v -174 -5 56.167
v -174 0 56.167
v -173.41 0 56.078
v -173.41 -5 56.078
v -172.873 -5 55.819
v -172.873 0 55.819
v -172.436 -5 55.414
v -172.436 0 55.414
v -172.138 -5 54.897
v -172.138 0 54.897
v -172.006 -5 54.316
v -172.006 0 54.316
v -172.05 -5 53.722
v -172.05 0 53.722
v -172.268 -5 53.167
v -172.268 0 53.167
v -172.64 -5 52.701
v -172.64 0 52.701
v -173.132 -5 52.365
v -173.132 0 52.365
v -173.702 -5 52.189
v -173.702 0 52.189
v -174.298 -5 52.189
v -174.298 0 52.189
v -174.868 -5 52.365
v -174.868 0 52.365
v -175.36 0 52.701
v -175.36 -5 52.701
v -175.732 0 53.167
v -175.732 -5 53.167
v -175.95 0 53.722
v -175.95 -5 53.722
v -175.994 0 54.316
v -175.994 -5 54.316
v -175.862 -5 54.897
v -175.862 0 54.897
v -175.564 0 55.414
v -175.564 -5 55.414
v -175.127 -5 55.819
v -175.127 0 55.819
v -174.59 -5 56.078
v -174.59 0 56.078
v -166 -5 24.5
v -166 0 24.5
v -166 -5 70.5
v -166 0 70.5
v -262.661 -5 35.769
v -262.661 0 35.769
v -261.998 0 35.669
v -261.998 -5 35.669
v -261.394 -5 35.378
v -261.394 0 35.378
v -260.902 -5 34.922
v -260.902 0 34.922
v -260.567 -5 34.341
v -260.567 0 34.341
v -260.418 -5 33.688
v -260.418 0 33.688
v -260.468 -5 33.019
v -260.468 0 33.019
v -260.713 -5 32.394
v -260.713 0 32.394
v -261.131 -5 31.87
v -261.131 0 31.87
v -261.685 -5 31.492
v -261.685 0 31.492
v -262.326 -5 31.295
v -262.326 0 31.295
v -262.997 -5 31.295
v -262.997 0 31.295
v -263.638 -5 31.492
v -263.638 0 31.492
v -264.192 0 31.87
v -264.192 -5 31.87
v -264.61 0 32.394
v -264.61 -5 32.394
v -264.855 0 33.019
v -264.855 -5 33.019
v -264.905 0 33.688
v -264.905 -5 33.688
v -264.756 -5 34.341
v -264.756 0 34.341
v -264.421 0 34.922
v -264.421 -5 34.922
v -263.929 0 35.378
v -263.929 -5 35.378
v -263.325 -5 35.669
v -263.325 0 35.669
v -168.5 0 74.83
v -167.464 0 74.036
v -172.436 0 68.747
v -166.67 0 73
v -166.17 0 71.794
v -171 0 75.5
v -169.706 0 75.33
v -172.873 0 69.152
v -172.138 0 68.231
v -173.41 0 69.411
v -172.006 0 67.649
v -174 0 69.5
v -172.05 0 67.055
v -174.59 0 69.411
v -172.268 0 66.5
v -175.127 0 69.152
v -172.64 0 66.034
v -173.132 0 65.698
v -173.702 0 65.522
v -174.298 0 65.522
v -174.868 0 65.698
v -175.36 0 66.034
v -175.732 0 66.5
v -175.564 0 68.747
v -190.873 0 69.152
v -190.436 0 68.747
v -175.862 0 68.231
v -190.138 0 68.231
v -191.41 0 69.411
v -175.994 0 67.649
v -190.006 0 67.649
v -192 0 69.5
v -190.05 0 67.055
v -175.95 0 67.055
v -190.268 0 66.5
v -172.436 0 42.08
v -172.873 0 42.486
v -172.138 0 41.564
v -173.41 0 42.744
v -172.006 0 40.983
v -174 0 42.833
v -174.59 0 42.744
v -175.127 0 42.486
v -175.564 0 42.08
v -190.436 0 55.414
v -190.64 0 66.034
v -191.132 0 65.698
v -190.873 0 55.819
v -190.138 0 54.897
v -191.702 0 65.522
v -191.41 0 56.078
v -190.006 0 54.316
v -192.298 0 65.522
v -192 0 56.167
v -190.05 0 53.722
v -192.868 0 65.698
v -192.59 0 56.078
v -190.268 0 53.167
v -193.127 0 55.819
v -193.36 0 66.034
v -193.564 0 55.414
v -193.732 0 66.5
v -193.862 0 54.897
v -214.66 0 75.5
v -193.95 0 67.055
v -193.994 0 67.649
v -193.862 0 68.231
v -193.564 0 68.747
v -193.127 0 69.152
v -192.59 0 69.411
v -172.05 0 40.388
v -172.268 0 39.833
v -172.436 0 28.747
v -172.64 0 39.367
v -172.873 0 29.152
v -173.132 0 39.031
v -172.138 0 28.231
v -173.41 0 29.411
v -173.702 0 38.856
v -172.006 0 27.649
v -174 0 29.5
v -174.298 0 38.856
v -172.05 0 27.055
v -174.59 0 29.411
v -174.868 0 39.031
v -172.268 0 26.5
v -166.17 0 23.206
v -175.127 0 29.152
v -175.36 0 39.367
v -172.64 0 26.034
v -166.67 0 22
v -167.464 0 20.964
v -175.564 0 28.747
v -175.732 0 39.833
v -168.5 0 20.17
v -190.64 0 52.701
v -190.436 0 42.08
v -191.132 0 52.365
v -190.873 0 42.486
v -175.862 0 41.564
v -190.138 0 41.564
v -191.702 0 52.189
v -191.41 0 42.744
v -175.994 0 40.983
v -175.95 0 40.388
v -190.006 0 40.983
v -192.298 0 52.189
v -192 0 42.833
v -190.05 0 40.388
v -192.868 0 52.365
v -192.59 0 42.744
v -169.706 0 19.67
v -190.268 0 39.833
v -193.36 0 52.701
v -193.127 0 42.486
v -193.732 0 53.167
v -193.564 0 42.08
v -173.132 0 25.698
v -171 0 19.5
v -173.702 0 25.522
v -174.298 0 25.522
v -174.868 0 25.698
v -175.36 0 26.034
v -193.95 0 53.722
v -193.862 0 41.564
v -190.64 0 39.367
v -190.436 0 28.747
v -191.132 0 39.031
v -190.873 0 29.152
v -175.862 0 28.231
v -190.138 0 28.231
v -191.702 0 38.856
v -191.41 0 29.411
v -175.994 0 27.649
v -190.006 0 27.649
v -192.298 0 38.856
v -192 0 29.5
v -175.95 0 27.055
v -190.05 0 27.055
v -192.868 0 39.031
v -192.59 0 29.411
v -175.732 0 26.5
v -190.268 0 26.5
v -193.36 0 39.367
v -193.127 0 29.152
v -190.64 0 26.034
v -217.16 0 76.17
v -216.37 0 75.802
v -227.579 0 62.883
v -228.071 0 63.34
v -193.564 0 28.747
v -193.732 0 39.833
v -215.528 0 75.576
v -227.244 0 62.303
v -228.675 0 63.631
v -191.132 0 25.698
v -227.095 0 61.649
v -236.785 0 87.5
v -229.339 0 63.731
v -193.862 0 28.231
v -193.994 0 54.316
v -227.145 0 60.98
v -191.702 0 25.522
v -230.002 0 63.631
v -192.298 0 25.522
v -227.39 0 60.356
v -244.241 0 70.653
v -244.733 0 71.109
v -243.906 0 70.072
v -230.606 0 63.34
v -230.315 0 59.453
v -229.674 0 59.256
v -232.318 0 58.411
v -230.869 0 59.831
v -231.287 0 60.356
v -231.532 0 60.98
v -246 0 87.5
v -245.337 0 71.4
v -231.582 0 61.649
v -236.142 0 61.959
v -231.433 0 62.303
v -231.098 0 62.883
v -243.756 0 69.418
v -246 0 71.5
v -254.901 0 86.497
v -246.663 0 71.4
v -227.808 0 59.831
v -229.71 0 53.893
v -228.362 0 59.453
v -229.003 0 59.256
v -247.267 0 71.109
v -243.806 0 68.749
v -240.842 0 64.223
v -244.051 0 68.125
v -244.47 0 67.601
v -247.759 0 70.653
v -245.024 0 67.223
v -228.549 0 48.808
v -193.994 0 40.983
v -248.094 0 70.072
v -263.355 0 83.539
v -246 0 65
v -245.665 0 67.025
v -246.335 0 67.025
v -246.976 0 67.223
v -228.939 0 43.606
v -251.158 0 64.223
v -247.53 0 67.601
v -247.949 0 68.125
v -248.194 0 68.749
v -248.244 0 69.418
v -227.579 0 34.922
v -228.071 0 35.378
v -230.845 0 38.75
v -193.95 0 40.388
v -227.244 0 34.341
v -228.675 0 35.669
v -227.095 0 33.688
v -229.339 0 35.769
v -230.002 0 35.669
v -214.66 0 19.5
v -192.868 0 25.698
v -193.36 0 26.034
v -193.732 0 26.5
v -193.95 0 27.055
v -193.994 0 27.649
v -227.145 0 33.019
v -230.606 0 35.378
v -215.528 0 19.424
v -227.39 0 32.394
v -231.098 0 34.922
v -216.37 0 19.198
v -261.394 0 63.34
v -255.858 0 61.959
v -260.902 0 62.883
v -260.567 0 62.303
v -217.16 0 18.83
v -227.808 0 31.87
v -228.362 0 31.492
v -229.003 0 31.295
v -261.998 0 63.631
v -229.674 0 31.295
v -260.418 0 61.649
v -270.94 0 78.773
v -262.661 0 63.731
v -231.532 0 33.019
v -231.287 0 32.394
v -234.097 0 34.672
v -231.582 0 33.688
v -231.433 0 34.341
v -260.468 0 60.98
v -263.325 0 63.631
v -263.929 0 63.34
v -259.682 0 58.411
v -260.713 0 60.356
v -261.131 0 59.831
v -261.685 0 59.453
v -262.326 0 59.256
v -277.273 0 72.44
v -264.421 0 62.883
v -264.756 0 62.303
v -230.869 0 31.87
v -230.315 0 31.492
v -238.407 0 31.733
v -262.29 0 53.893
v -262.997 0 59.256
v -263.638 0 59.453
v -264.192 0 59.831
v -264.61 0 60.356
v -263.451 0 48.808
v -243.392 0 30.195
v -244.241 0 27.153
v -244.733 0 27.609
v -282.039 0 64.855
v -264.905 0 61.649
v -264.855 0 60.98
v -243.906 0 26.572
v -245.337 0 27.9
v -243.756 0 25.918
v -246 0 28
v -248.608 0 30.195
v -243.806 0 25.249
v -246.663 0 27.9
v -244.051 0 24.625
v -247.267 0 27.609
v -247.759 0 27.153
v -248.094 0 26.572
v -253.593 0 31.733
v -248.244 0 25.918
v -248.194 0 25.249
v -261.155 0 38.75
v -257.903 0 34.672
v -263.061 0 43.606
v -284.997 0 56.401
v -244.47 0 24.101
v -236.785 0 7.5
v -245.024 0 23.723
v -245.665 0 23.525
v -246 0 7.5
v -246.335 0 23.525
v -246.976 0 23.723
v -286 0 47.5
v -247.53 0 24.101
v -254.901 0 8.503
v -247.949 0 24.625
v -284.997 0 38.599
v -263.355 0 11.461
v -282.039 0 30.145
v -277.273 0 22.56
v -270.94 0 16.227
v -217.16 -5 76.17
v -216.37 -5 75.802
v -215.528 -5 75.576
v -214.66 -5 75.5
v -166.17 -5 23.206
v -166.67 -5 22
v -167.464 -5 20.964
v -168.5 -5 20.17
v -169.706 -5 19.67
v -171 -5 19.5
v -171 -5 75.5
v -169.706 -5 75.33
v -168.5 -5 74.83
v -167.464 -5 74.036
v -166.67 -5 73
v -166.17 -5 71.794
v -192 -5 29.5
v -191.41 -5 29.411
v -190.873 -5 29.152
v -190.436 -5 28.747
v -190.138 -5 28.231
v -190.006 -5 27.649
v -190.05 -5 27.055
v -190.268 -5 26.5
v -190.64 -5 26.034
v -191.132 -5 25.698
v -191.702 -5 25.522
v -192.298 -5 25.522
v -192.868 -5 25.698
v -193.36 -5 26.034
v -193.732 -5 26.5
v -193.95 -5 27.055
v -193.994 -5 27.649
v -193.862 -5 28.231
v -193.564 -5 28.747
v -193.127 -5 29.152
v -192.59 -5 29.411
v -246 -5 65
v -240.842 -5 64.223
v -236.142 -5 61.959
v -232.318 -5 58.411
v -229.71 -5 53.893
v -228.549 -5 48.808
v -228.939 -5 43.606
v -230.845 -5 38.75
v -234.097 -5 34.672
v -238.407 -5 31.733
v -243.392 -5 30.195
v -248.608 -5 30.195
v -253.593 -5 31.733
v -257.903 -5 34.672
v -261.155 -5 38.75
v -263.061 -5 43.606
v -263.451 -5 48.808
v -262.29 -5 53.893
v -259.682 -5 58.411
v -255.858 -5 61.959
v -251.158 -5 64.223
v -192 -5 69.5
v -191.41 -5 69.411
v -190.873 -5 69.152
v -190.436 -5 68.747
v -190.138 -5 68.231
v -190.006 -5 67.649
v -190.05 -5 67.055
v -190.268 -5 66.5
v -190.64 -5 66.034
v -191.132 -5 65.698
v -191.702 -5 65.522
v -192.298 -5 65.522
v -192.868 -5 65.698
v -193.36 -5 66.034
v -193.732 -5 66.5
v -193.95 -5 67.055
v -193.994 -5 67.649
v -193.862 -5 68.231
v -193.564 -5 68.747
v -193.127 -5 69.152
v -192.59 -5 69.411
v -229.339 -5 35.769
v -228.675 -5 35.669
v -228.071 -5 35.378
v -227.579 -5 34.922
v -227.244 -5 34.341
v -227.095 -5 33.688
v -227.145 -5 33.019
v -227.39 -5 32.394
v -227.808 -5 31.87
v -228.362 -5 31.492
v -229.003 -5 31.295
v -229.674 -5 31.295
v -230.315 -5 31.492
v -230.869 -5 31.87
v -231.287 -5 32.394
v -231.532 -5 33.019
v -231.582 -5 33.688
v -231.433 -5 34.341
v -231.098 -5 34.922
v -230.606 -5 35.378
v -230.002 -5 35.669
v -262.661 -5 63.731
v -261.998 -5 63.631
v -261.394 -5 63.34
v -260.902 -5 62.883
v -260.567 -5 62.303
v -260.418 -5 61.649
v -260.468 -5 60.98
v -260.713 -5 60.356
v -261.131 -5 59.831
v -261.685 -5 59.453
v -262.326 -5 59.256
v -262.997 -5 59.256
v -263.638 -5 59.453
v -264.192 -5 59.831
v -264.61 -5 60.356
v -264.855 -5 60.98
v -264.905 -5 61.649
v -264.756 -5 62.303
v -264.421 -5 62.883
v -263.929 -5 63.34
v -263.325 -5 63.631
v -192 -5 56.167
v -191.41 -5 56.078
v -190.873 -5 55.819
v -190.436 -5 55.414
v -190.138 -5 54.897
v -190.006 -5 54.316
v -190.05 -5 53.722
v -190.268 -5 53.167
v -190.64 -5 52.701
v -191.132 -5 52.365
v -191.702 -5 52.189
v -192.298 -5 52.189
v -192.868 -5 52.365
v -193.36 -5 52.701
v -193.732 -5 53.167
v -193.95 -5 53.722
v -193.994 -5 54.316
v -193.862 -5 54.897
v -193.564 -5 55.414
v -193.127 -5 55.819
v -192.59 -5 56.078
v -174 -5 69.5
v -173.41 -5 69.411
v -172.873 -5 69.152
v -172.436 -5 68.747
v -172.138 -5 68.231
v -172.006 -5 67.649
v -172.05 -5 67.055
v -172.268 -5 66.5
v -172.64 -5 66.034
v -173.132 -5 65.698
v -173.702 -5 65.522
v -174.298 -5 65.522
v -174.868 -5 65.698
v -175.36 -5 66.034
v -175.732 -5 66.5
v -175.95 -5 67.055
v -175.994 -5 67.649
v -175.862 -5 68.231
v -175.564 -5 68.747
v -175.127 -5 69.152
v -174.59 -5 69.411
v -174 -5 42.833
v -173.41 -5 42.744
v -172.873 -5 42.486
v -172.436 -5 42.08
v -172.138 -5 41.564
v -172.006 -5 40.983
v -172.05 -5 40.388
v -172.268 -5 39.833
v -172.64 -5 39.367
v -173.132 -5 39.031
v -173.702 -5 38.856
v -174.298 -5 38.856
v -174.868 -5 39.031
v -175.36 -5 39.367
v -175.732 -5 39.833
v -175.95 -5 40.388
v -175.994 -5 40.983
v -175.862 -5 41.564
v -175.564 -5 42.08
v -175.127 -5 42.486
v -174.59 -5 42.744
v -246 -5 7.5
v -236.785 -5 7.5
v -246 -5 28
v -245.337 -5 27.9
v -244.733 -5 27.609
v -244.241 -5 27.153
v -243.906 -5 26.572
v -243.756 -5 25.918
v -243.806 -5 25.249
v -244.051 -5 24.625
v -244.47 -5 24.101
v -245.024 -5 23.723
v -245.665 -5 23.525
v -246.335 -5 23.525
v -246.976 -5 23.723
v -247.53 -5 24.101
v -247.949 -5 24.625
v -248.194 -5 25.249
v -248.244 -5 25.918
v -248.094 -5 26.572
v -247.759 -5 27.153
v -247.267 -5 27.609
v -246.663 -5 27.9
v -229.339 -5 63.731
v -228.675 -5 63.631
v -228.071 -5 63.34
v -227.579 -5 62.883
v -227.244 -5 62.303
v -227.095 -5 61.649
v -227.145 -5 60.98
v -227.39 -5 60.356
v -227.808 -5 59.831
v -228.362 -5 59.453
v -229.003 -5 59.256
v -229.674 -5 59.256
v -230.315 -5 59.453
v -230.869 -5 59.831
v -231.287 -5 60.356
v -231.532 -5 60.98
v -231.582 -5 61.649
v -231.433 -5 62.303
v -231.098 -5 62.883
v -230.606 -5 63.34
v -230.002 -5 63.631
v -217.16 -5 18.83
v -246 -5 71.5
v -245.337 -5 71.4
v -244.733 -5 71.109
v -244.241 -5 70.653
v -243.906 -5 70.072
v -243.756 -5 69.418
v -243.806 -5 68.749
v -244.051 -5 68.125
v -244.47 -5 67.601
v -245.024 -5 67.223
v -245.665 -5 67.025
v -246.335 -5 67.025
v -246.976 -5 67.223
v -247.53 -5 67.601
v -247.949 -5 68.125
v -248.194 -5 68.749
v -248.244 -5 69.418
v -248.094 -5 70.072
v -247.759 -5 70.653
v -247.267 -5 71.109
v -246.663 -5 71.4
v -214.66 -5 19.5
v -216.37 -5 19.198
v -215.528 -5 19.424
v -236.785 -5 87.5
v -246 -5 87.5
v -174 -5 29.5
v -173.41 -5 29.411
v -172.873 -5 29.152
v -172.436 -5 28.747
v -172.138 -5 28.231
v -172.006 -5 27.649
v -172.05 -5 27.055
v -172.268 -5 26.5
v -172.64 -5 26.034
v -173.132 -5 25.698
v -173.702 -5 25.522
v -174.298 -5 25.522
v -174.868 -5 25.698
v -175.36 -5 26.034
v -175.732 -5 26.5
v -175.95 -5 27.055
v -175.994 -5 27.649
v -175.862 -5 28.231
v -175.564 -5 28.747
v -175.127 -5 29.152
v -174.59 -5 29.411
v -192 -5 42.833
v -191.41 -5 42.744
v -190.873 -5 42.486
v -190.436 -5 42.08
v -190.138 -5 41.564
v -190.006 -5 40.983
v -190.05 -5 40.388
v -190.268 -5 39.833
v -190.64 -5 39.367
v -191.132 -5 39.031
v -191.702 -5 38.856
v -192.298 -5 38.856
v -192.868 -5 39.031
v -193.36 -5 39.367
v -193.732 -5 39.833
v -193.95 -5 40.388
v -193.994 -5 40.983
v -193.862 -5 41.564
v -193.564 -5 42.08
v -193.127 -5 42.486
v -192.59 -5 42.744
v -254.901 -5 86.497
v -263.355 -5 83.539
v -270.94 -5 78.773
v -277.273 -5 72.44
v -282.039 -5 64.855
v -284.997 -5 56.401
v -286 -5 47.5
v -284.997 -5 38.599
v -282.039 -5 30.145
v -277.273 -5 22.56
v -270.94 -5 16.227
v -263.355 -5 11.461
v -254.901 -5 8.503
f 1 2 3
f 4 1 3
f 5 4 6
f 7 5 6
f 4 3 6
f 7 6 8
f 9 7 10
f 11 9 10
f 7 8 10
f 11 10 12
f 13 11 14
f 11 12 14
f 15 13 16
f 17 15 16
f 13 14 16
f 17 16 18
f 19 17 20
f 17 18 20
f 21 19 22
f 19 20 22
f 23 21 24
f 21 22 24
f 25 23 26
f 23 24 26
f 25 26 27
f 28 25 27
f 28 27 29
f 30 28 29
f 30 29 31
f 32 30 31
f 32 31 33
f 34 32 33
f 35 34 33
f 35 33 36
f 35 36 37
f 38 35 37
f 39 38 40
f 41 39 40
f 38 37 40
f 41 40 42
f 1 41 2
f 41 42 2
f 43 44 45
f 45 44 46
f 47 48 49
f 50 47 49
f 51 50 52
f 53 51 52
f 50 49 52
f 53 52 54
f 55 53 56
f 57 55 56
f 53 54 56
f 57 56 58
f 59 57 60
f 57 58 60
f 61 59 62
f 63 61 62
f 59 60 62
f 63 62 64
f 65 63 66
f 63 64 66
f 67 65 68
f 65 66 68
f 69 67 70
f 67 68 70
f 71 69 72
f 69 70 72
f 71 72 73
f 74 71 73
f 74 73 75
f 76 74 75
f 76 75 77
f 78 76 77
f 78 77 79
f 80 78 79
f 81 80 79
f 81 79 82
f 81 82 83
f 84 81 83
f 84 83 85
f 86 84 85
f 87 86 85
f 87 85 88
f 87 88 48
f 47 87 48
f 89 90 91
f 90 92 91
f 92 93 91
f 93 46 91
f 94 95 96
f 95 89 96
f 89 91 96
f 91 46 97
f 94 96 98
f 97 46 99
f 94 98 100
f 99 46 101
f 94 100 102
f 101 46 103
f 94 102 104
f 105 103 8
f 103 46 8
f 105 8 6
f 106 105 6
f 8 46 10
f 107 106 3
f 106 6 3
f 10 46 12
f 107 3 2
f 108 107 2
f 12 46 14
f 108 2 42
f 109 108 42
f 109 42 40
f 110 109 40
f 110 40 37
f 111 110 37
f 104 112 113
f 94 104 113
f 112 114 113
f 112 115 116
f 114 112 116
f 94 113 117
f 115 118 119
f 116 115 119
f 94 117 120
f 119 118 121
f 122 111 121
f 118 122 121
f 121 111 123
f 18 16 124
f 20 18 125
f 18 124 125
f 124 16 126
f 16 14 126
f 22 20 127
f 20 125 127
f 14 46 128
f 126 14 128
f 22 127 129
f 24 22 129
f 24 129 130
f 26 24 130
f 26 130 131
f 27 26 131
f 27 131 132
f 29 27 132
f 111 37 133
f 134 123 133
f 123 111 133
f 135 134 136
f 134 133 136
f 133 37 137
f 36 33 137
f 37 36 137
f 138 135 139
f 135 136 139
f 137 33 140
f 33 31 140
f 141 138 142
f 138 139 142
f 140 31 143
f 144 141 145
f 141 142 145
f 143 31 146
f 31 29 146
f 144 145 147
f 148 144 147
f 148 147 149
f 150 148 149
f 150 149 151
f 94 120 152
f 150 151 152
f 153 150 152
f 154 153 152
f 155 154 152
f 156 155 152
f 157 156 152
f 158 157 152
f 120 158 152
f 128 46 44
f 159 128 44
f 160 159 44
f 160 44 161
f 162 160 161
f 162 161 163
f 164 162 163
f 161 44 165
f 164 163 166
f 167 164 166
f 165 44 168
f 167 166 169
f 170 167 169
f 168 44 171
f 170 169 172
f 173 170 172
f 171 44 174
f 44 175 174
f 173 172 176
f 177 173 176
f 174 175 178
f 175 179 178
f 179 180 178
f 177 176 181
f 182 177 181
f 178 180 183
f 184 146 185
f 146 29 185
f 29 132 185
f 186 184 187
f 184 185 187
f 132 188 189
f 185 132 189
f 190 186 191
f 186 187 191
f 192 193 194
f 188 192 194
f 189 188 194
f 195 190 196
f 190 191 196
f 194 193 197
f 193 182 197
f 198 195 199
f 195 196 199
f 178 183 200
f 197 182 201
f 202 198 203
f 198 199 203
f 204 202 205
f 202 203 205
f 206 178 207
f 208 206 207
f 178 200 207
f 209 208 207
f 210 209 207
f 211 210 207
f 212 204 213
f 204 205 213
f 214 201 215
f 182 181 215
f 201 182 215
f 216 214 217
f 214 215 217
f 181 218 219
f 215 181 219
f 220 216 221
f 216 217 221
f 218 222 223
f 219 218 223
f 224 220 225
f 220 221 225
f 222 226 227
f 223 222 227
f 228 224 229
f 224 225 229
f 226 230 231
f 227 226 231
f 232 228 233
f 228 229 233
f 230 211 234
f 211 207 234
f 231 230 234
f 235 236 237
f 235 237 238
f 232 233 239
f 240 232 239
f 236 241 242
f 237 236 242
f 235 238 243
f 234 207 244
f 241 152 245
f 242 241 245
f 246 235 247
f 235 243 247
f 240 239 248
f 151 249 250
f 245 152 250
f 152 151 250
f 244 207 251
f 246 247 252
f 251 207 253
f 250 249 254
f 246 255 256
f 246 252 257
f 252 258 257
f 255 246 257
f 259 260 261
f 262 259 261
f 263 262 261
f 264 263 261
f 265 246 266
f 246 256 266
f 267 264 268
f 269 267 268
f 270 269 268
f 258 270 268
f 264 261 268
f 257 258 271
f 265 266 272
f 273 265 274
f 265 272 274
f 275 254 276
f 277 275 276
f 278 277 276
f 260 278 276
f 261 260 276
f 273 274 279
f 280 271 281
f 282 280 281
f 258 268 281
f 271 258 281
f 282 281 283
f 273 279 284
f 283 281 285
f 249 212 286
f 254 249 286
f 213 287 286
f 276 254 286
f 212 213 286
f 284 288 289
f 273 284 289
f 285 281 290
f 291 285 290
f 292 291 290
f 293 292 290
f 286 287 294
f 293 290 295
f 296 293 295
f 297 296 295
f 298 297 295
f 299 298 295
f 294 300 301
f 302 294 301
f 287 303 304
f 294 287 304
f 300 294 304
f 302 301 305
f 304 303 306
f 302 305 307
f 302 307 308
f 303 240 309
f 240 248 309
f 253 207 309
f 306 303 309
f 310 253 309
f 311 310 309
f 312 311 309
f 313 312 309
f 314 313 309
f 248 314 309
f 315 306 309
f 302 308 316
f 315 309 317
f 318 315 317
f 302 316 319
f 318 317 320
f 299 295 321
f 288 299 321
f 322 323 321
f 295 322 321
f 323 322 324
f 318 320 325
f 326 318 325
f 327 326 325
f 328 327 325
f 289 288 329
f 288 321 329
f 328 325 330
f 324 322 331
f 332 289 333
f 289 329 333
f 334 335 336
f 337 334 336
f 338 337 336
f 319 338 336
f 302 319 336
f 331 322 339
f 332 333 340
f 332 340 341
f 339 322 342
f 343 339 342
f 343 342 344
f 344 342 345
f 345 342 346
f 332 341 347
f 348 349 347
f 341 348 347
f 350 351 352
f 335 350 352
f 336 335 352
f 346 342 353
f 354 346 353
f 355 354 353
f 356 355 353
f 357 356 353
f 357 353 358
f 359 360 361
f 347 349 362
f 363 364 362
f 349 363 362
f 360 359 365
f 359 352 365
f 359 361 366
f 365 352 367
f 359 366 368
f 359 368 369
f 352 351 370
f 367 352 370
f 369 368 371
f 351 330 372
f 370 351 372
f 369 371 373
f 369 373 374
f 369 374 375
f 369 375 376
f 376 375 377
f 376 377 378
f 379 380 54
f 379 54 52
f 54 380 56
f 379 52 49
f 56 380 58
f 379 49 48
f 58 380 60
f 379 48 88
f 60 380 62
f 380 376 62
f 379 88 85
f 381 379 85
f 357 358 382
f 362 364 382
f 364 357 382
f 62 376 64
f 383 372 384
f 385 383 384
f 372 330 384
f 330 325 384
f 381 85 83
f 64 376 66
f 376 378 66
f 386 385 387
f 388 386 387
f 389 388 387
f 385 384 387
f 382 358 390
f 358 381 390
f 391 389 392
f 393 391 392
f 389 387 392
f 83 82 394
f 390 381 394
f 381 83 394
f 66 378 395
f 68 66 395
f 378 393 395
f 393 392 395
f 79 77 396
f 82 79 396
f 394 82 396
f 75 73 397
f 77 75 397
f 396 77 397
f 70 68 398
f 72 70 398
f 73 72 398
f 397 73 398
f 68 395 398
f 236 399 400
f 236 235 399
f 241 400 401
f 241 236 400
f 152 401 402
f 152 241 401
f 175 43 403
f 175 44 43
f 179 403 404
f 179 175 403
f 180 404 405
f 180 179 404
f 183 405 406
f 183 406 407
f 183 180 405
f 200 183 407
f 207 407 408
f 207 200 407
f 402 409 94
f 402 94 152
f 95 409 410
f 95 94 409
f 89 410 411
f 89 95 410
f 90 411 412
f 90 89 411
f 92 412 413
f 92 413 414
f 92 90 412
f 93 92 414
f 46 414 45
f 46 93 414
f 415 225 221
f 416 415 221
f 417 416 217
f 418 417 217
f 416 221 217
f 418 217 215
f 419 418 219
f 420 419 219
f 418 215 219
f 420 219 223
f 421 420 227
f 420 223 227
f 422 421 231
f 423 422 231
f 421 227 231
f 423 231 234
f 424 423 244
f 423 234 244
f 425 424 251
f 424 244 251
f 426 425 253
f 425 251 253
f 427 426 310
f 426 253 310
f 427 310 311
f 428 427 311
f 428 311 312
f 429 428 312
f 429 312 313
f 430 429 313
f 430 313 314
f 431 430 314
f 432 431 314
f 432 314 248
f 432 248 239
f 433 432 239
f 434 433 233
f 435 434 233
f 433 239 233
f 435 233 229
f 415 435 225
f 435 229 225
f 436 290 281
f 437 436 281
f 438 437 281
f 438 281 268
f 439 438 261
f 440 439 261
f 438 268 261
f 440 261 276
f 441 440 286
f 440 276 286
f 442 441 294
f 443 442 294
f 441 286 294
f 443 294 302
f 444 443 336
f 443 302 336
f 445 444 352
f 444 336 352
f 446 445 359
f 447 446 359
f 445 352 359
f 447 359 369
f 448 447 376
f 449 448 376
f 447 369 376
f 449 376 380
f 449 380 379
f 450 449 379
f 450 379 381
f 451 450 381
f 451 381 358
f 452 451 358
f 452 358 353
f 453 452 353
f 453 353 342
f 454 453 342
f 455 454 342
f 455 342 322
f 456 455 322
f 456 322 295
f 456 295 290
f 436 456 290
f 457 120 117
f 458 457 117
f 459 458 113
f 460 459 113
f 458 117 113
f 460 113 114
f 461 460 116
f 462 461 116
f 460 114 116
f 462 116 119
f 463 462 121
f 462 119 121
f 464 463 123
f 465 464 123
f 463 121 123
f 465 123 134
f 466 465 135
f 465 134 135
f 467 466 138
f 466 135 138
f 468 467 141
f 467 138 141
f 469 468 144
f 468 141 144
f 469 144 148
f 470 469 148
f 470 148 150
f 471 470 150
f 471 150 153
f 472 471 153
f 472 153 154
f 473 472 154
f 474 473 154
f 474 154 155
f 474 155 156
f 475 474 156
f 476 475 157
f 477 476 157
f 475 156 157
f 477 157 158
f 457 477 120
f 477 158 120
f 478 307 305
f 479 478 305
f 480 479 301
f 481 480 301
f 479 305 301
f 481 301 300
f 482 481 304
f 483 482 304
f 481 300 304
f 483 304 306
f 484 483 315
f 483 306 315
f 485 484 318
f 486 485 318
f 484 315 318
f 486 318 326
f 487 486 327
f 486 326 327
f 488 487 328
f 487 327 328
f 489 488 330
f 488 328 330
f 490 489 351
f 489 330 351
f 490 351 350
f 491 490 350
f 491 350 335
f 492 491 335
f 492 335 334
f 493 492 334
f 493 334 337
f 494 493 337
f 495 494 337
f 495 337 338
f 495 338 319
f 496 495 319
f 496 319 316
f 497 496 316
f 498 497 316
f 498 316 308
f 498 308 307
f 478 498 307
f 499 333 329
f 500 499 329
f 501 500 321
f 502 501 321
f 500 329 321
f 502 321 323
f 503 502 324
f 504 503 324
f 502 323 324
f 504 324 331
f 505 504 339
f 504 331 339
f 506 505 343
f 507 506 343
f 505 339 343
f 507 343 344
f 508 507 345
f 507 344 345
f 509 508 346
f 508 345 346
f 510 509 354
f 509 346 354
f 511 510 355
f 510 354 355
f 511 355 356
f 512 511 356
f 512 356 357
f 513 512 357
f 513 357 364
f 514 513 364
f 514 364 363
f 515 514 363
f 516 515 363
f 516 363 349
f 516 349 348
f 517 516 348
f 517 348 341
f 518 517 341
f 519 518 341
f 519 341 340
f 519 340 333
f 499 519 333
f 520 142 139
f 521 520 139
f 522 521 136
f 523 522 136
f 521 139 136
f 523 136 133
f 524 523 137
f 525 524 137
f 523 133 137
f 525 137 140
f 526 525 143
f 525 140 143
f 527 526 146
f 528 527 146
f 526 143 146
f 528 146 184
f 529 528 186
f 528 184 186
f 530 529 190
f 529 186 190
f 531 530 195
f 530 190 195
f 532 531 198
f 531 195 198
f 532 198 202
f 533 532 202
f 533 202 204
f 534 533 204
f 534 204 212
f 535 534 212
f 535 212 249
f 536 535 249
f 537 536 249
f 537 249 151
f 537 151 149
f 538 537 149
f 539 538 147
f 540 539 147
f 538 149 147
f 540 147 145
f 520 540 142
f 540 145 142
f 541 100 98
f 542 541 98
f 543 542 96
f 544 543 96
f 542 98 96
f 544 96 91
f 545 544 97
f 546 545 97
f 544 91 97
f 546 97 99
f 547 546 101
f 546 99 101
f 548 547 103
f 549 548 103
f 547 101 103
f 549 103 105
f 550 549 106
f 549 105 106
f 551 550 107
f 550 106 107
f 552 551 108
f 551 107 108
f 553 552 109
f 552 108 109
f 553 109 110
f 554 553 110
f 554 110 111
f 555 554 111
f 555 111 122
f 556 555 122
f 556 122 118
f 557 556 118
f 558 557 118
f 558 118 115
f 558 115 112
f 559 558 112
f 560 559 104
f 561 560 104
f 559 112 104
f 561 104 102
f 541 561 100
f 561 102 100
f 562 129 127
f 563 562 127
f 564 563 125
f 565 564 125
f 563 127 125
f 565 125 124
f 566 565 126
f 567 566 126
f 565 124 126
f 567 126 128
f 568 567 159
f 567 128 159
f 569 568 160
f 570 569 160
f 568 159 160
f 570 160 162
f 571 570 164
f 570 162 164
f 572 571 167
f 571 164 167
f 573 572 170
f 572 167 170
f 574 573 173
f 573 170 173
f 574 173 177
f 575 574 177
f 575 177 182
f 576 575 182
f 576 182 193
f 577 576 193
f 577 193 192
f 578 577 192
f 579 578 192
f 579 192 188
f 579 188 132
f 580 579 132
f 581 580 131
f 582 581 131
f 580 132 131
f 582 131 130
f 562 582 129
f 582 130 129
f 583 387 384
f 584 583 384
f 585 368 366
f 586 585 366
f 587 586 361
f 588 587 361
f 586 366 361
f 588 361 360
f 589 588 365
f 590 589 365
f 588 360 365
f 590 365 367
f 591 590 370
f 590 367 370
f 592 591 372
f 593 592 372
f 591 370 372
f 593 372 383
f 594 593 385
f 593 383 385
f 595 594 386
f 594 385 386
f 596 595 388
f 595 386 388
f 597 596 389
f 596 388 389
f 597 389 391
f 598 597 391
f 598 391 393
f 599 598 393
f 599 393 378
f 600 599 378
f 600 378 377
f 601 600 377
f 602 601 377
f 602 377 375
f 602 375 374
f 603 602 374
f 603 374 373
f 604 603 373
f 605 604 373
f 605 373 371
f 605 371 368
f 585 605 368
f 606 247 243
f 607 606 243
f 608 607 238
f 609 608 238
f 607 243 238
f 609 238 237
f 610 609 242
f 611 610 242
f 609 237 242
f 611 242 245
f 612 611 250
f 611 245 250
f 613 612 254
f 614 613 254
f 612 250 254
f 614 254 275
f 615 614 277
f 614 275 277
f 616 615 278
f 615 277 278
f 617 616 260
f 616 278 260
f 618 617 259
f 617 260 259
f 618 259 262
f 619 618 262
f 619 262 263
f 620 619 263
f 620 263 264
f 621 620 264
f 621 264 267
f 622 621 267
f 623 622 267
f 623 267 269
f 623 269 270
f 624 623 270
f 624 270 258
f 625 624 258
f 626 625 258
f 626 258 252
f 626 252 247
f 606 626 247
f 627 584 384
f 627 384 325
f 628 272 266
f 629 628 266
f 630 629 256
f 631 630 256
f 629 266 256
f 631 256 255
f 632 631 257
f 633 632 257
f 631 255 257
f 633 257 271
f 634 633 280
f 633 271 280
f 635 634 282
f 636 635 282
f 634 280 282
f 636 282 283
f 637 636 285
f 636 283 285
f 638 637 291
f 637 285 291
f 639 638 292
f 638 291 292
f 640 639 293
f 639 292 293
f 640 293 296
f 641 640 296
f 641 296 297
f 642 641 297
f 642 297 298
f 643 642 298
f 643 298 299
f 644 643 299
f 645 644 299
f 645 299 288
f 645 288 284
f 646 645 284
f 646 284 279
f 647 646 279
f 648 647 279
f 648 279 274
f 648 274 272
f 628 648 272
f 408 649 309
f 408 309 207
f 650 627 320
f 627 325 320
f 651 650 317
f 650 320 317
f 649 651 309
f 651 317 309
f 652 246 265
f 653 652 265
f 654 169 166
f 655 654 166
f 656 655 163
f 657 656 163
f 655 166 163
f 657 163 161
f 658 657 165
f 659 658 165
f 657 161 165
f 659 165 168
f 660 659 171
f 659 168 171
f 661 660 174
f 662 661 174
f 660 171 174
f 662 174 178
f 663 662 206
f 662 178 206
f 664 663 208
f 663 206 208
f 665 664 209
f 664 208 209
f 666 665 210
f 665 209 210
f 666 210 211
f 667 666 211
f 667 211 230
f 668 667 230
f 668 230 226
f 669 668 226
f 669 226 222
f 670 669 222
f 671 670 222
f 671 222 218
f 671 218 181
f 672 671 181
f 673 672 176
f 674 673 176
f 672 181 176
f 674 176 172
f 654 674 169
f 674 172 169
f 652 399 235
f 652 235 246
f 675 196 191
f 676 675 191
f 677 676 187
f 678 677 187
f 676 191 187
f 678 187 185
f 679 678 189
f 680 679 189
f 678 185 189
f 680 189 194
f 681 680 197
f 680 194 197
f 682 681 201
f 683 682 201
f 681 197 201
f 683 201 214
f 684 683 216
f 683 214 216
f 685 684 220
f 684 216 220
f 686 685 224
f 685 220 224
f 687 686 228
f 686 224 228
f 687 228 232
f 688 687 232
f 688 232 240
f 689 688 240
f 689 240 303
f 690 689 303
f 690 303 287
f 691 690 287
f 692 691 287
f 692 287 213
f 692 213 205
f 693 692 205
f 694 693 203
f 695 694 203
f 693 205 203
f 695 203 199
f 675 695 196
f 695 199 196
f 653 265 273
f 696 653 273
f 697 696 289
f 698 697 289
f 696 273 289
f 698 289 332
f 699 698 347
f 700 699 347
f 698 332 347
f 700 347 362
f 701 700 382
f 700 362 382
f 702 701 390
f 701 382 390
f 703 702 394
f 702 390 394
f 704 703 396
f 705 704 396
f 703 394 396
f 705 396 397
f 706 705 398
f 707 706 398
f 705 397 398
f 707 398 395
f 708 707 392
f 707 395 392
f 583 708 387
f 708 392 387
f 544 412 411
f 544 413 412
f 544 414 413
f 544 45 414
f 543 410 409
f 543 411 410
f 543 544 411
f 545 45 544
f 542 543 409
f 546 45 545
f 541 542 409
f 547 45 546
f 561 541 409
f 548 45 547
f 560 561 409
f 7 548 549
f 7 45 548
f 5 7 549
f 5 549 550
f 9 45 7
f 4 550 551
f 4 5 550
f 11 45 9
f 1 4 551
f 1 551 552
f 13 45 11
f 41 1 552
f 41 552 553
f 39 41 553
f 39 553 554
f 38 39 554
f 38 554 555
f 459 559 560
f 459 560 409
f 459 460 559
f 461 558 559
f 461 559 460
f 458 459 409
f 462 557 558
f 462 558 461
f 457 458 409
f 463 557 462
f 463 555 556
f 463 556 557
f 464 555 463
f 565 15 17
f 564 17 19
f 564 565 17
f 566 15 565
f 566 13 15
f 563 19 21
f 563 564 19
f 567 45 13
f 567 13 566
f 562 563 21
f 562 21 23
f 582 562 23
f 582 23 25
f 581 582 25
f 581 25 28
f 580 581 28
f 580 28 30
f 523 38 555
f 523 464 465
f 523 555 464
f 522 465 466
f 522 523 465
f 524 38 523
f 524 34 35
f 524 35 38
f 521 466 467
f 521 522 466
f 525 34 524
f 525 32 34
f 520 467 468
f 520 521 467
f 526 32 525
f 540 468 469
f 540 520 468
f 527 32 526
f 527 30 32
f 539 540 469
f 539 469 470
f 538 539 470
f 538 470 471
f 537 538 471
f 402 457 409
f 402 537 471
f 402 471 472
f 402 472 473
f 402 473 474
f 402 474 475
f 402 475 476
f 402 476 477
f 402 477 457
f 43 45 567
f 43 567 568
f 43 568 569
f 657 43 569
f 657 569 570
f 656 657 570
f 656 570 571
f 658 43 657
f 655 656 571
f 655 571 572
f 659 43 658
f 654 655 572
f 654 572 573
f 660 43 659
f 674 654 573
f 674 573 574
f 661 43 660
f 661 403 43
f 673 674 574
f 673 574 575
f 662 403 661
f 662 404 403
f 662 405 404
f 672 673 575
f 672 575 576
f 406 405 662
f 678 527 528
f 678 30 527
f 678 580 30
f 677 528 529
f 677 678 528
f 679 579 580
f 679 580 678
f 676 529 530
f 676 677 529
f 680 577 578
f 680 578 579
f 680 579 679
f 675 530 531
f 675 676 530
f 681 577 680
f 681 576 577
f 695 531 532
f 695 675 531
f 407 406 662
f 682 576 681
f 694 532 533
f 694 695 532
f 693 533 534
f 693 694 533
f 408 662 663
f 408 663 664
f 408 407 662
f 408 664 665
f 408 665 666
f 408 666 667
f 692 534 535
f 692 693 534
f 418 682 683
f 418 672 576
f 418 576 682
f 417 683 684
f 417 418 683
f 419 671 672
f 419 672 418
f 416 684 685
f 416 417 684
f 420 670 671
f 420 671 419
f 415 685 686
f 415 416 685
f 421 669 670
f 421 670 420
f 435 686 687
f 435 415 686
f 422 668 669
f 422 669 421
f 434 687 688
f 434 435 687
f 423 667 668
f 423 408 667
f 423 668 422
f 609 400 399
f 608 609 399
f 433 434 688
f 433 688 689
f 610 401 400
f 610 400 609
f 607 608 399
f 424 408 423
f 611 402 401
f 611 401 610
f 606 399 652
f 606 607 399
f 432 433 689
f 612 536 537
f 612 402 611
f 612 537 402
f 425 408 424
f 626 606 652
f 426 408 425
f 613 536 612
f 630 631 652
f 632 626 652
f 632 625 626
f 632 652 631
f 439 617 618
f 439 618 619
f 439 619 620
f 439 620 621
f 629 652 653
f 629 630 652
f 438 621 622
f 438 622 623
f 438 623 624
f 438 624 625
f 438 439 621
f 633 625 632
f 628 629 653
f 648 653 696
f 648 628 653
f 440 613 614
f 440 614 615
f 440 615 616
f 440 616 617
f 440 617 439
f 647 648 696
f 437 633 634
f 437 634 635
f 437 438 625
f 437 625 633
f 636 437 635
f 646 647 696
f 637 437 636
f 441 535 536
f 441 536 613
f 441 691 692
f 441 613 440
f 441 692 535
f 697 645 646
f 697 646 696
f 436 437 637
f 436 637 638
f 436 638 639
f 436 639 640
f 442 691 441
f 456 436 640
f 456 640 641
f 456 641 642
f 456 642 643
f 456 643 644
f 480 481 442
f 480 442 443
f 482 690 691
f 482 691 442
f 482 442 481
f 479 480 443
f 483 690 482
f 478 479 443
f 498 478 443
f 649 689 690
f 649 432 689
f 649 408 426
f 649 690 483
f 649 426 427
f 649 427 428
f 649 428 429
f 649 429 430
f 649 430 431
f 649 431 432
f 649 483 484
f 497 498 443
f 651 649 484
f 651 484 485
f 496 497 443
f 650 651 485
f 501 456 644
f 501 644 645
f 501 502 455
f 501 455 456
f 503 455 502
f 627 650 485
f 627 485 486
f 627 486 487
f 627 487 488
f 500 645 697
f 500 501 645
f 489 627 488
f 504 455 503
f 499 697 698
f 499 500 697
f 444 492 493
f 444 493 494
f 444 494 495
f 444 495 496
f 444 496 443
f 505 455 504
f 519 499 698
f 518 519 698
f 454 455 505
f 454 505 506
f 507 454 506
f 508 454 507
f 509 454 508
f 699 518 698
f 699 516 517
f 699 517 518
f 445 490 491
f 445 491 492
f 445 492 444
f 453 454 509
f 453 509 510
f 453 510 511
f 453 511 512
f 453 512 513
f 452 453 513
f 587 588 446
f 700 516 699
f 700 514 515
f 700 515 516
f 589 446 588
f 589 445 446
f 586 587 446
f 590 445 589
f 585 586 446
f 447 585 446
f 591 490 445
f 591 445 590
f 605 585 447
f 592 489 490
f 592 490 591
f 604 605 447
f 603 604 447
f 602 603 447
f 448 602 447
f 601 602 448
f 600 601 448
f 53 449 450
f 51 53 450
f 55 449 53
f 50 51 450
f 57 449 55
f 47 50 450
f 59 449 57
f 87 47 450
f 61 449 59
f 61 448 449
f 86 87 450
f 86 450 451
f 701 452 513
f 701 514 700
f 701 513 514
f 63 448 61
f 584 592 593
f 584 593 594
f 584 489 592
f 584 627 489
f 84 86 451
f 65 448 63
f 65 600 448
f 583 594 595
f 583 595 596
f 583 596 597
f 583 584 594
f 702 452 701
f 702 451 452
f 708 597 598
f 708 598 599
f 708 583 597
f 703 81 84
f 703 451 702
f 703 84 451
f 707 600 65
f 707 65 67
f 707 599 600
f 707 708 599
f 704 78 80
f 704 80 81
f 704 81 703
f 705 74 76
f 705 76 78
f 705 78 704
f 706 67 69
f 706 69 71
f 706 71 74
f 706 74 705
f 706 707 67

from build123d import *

# Parameters (mm, degrees)
SKETCH_1_W          = 270
SKETCH_1_H          = 5
EXTRUDE_1_DEPTH     = 95
SKETCH_2_R          = 2.25
SKETCH_2_R_2        = 17.5
CUT_EXTRUDE_1_DEPTH = 10
SKETCH_3_W          = 70
SKETCH_3_H          = 20
CUT_EXTRUDE_2_DEPTH = 10
SKETCH_6_W          = 219.864116777
SKETCH_6_H          = 129.686347052
CUT_EXTRUDE_5_DEPTH = 10
SKETCH_7_W          = 55.982845341
SKETCH_7_H          = 55
EXTRUDE_1_2_DEPTH   = 5
SKETCH_9_R          = 2
CUT_EXTRUDE_6_DEPTH = 5
FILLET_1_R          = 5
CUT_EXTRUDE_START   = -5
CUT_EXTRUDE_7_DEPTH = 5
FILLET_2_R          = 5


with BuildPart() as part:
    # 草图1 → Extrude 1 (new body)
    with BuildSketch(Plane.XY):
        with Locations((-135, -2.5)):
            Rectangle(SKETCH_1_W, SKETCH_1_H)
    extrude(amount=EXTRUDE_1_DEPTH)

    # 草图2 → 切除-拉伸1 (cut)
    with BuildSketch(Plane(origin=(0, 0, 0), x_dir=(1, 0, 0), z_dir=(0, 1, 0))):
        with Locations(Location((-246, -25.75, 0), (0, 0, 270))):
            Circle(SKETCH_2_R)
        with Locations(Location((-229.338533362, -33.519369489, 0), (0, 0, 270))):
            Circle(SKETCH_2_R)
        with Locations(Location((-262.661466638, -33.519369489, 0), (0, 0, 270))):
            Circle(SKETCH_2_R)
        with Locations(Location((-262.661466638, -61.480630511, 0), (0, 0, 270))):
            Circle(SKETCH_2_R)
        with Locations(Location((-246, -69.25, 0), (0, 0, 270))):
            Circle(SKETCH_2_R)
        with Locations(Location((-229.338533362, -61.480630511, 0), (0, 0, 270))):
            Circle(SKETCH_2_R)
        with Locations(Location((-246, -47.5, 0), (0, 0, 270))):
            Circle(SKETCH_2_R_2)
    extrude(amount=-CUT_EXTRUDE_1_DEPTH, mode=Mode.SUBTRACT)

    # 草图3 → 切除-拉伸2 (cut)
    with BuildSketch(Plane(origin=(0, 0, 0), x_dir=(1, 0, 0), z_dir=(0, 1, 0))):
        with Locations((-235, -85)):
            Rectangle(SKETCH_3_W, SKETCH_3_H)
        with Locations((-235, -10)):
            Rectangle(SKETCH_3_W, SKETCH_3_H)
        with BuildLine():
            Line((-190, -10), (-190, -34.757359313))
            ThreePointArc((-190, -34.757359313), (-188.148050297, -37.52899791), (-184.878679656, -36.878679656))
            Line((-184.878679656, -36.878679656), (-160.121320344, -12.121320344))
            ThreePointArc((-160.121320344, -12.121320344), (-159.47100209, -8.851949703), (-162.242640687, -7))
            Line((-162.242640687, -7), (-187, -7))
            ThreePointArc((-187, -7), (-189.121320344, -7.878679656), (-190, -10))
        make_face()
        with BuildLine():
            Line((-154.121320344, -12.121320344), (-178.878679656, -36.878679656))
            ThreePointArc((-178.878679656, -36.878679656), (-179.52899791, -40.148050297), (-176.757359313, -42))
            Line((-176.757359313, -42), (-152, -42))
            ThreePointArc((-152, -42), (-149.878679656, -41.121320344), (-149, -39))
            Line((-149, -39), (-149, -14.242640687))
            ThreePointArc((-149, -14.242640687), (-150.851949703, -11.47100209), (-154.121320344, -12.121320344))
        make_face()
        with BuildLine():
            Line((-112.242640687, -7), (-137, -7))
            ThreePointArc((-137, -7), (-139.121320344, -7.878679656), (-140, -10))
            Line((-140, -10), (-140, -34.757359313))
            ThreePointArc((-140, -34.757359313), (-138.148050297, -37.52899791), (-134.878679656, -36.878679656))
            Line((-134.878679656, -36.878679656), (-110.121320344, -12.121320344))
            ThreePointArc((-110.121320344, -12.121320344), (-109.47100209, -8.851949703), (-112.242640687, -7))
        make_face()
        with BuildLine():
            Line((-99, -39), (-99, -14.242640687))
            ThreePointArc((-99, -14.242640687), (-100.851949703, -11.47100209), (-104.121320344, -12.121320344))
            Line((-104.121320344, -12.121320344), (-128.878679656, -36.878679656))
            ThreePointArc((-128.878679656, -36.878679656), (-129.52899791, -40.148050297), (-126.757359313, -42))
            Line((-126.757359313, -42), (-102, -42))
            ThreePointArc((-102, -42), (-99.878679656, -41.121320344), (-99, -39))
        make_face()
        with BuildLine():
            Line((-112.242640687, -52), (-137, -52))
            ThreePointArc((-137, -52), (-139.121320344, -52.878679656), (-140, -55))
            Line((-140, -55), (-140, -79.757359313))
            ThreePointArc((-140, -79.757359313), (-138.148050297, -82.52899791), (-134.878679656, -81.878679656))
            Line((-134.878679656, -81.878679656), (-110.121320344, -57.121320344))
            ThreePointArc((-110.121320344, -57.121320344), (-109.47100209, -53.851949703), (-112.242640687, -52))
        make_face()
        with BuildLine():
            Line((-99, -84), (-99, -59.242640687))
            ThreePointArc((-99, -59.242640687), (-100.851949703, -56.47100209), (-104.121320344, -57.121320344))
            Line((-104.121320344, -57.121320344), (-128.878679656, -81.878679656))
            ThreePointArc((-128.878679656, -81.878679656), (-129.52899791, -85.148050297), (-126.757359313, -87))
            Line((-126.757359313, -87), (-102, -87))
            ThreePointArc((-102, -87), (-99.878679656, -86.121320344), (-99, -84))
        make_face()
        with BuildLine():
            Line((-162.242640687, -52), (-187, -52))
            ThreePointArc((-187, -52), (-189.121320344, -52.878679656), (-190, -55))
            Line((-190, -55), (-190, -79.757359313))
            ThreePointArc((-190, -79.757359313), (-188.148050297, -82.52899791), (-184.878679656, -81.878679656))
            Line((-184.878679656, -81.878679656), (-160.121320344, -57.121320344))
            ThreePointArc((-160.121320344, -57.121320344), (-159.47100209, -53.851949703), (-162.242640687, -52))
        make_face()
        with BuildLine():
            Line((-149, -84), (-149, -59.242640687))
            ThreePointArc((-149, -59.242640687), (-150.851949703, -56.47100209), (-154.121320344, -57.121320344))
            Line((-154.121320344, -57.121320344), (-178.878679656, -81.878679656))
            ThreePointArc((-178.878679656, -81.878679656), (-179.52899791, -85.148050297), (-176.757359313, -87))
            Line((-176.757359313, -87), (-152, -87))
            ThreePointArc((-152, -87), (-149.878679656, -86.121320344), (-149, -84))
        make_face()
        with BuildLine():
            Line((-62.242640687, -7), (-87, -7))
            ThreePointArc((-87, -7), (-89.121320344, -7.878679656), (-90, -10))
            Line((-90, -10), (-90, -34.757359313))
            ThreePointArc((-90, -34.757359313), (-88.148050297, -37.52899791), (-84.878679656, -36.878679656))
            Line((-84.878679656, -36.878679656), (-60.121320344, -12.121320344))
            ThreePointArc((-60.121320344, -12.121320344), (-59.47100209, -8.851949703), (-62.242640687, -7))
        make_face()
        with BuildLine():
            Line((-49, -39), (-49, -14.242640687))
            ThreePointArc((-49, -14.242640687), (-50.851949703, -11.47100209), (-54.121320344, -12.121320344))
            Line((-54.121320344, -12.121320344), (-78.878679656, -36.878679656))
            ThreePointArc((-78.878679656, -36.878679656), (-79.52899791, -40.148050297), (-76.757359313, -42))
            Line((-76.757359313, -42), (-52, -42))
            ThreePointArc((-52, -42), (-49.878679656, -41.121320344), (-49, -39))
        make_face()
        with BuildLine():
            Line((-62.242640687, -52), (-87, -52))
            ThreePointArc((-87, -52), (-89.121320344, -52.878679656), (-90, -55))
            Line((-90, -55), (-90, -79.757359313))
            ThreePointArc((-90, -79.757359313), (-88.148050297, -82.52899791), (-84.878679656, -81.878679656))
            Line((-84.878679656, -81.878679656), (-60.121320344, -57.121320344))
            ThreePointArc((-60.121320344, -57.121320344), (-59.47100209, -53.851949703), (-62.242640687, -52))
        make_face()
        with BuildLine():
            Line((-49, -84), (-49, -59.242640687))
            ThreePointArc((-49, -59.242640687), (-50.851949703, -56.47100209), (-54.121320344, -57.121320344))
            Line((-54.121320344, -57.121320344), (-78.878679656, -81.878679656))
            ThreePointArc((-78.878679656, -81.878679656), (-79.52899791, -85.148050297), (-76.757359313, -87))
            Line((-76.757359313, -87), (-52, -87))
            ThreePointArc((-52, -87), (-49.878679656, -86.121320344), (-49, -84))
        make_face()
    extrude(amount=-CUT_EXTRUDE_2_DEPTH, mode=Mode.SUBTRACT)

    # 草图6 → 切除-拉伸5 (cut)
    with BuildSketch(Plane(origin=(0, 0, 0), x_dir=(1, 0, 0), z_dir=(0, 1, 0))):
        with Locations((-104.085096271, -53.191913683)):
            Rectangle(SKETCH_6_W, SKETCH_6_H)
    extrude(amount=-CUT_EXTRUDE_5_DEPTH, mode=Mode.SUBTRACT)

    # 草图7 → Extrude 1 2 (add)
    with BuildSketch(Plane(origin=(0, 0, 0), x_dir=(1, 0, 0), z_dir=(0, 1, 0))):
        with BuildLine():
            Line((-246, -7.5), (-166, -7.5))
            Line((-166, -7.5), (-166, -87.5))
            Line((-166, -87.5), (-246, -87.5))
            ThreePointArc((-246, -87.5), (-286, -47.5), (-246, -7.5))
        make_face()
        with Locations((-242.008577329, -47.5)):
            Rectangle(SKETCH_7_W, SKETCH_7_H, mode=Mode.SUBTRACT)
    extrude(amount=-EXTRUDE_1_2_DEPTH)

    # 草图9 → 切除-拉伸6 (cut)
    with BuildSketch(Plane(origin=(0, 0, 0), x_dir=(1, 0, 0), z_dir=(0, 1, 0))):
        with Locations(Location((-192, -27.5, 0), (0, 0, 270))):
            Circle(SKETCH_9_R)
        with Locations(Location((-174, -27.5, 0), (0, 0, 270))):
            Circle(SKETCH_9_R)
        with Locations(Location((-174, -40.833333333, 0), (0, 0, 270))):
            Circle(SKETCH_9_R)
        with Locations(Location((-174, -54.166666667, 0), (0, 0, 270))):
            Circle(SKETCH_9_R)
        with Locations(Location((-174, -67.5, 0), (0, 0, 270))):
            Circle(SKETCH_9_R)
        with Locations(Location((-192, -40.833333333, 0), (0, 0, 270))):
            Circle(SKETCH_9_R)
        with Locations(Location((-192, -54.166666667, 0), (0, 0, 270))):
            Circle(SKETCH_9_R)
        with Locations(Location((-192, -67.5, 0), (0, 0, 270))):
            Circle(SKETCH_9_R)
    extrude(amount=-CUT_EXTRUDE_6_DEPTH, mode=Mode.SUBTRACT)

    # 圆角1
    fillet_1_edges = [part.edges().sort_by_distance(p)[0] for p in [
        (-166, -2.5, 7.5),
        (-166, -2.5, 87.5),
    ]]
    fillet(fillet_1_edges, radius=FILLET_1_R)

    # 草图10 → 切除-拉伸7 (cut)
    with BuildSketch(Plane(origin=(0, 0, 0), x_dir=(1, 0, 0), z_dir=(0, 1, 0)).offset(CUT_EXTRUDE_START)):
        with BuildLine():
            Line((-171, -7.5), (-236.784609691, -7.5))
            Line((-236.784609691, -7.5), (-216, -19.5))
            Line((-216, -19.5), (-166, -19.5))
            Line((-166, -19.5), (-166, -12.5))
            ThreePointArc((-166, -12.5), (-167.464466094, -8.964466094), (-171, -7.5))
        make_face()
        with BuildLine():
            Line((-166, -82.5), (-166, -75.5))
            Line((-166, -75.5), (-216, -75.5))
            Line((-216, -75.5), (-236.784609691, -87.5))
            Line((-236.784609691, -87.5), (-171, -87.5))
            ThreePointArc((-171, -87.5), (-167.464466094, -86.035533906), (-166, -82.5))
        make_face()
    extrude(amount=CUT_EXTRUDE_7_DEPTH, mode=Mode.SUBTRACT)

    # 圆角2
    fillet_2_edges = [part.edges().sort_by_distance(p)[0] for p in [
        (-216, -2.5, 19.5),
        (-166, -2.5, 19.5),
        (-216, -2.5, 75.5),
        (-166, -2.5, 75.5),
    ]]
    fillet(fillet_2_edges, radius=FILLET_2_R)


solid = part.part
